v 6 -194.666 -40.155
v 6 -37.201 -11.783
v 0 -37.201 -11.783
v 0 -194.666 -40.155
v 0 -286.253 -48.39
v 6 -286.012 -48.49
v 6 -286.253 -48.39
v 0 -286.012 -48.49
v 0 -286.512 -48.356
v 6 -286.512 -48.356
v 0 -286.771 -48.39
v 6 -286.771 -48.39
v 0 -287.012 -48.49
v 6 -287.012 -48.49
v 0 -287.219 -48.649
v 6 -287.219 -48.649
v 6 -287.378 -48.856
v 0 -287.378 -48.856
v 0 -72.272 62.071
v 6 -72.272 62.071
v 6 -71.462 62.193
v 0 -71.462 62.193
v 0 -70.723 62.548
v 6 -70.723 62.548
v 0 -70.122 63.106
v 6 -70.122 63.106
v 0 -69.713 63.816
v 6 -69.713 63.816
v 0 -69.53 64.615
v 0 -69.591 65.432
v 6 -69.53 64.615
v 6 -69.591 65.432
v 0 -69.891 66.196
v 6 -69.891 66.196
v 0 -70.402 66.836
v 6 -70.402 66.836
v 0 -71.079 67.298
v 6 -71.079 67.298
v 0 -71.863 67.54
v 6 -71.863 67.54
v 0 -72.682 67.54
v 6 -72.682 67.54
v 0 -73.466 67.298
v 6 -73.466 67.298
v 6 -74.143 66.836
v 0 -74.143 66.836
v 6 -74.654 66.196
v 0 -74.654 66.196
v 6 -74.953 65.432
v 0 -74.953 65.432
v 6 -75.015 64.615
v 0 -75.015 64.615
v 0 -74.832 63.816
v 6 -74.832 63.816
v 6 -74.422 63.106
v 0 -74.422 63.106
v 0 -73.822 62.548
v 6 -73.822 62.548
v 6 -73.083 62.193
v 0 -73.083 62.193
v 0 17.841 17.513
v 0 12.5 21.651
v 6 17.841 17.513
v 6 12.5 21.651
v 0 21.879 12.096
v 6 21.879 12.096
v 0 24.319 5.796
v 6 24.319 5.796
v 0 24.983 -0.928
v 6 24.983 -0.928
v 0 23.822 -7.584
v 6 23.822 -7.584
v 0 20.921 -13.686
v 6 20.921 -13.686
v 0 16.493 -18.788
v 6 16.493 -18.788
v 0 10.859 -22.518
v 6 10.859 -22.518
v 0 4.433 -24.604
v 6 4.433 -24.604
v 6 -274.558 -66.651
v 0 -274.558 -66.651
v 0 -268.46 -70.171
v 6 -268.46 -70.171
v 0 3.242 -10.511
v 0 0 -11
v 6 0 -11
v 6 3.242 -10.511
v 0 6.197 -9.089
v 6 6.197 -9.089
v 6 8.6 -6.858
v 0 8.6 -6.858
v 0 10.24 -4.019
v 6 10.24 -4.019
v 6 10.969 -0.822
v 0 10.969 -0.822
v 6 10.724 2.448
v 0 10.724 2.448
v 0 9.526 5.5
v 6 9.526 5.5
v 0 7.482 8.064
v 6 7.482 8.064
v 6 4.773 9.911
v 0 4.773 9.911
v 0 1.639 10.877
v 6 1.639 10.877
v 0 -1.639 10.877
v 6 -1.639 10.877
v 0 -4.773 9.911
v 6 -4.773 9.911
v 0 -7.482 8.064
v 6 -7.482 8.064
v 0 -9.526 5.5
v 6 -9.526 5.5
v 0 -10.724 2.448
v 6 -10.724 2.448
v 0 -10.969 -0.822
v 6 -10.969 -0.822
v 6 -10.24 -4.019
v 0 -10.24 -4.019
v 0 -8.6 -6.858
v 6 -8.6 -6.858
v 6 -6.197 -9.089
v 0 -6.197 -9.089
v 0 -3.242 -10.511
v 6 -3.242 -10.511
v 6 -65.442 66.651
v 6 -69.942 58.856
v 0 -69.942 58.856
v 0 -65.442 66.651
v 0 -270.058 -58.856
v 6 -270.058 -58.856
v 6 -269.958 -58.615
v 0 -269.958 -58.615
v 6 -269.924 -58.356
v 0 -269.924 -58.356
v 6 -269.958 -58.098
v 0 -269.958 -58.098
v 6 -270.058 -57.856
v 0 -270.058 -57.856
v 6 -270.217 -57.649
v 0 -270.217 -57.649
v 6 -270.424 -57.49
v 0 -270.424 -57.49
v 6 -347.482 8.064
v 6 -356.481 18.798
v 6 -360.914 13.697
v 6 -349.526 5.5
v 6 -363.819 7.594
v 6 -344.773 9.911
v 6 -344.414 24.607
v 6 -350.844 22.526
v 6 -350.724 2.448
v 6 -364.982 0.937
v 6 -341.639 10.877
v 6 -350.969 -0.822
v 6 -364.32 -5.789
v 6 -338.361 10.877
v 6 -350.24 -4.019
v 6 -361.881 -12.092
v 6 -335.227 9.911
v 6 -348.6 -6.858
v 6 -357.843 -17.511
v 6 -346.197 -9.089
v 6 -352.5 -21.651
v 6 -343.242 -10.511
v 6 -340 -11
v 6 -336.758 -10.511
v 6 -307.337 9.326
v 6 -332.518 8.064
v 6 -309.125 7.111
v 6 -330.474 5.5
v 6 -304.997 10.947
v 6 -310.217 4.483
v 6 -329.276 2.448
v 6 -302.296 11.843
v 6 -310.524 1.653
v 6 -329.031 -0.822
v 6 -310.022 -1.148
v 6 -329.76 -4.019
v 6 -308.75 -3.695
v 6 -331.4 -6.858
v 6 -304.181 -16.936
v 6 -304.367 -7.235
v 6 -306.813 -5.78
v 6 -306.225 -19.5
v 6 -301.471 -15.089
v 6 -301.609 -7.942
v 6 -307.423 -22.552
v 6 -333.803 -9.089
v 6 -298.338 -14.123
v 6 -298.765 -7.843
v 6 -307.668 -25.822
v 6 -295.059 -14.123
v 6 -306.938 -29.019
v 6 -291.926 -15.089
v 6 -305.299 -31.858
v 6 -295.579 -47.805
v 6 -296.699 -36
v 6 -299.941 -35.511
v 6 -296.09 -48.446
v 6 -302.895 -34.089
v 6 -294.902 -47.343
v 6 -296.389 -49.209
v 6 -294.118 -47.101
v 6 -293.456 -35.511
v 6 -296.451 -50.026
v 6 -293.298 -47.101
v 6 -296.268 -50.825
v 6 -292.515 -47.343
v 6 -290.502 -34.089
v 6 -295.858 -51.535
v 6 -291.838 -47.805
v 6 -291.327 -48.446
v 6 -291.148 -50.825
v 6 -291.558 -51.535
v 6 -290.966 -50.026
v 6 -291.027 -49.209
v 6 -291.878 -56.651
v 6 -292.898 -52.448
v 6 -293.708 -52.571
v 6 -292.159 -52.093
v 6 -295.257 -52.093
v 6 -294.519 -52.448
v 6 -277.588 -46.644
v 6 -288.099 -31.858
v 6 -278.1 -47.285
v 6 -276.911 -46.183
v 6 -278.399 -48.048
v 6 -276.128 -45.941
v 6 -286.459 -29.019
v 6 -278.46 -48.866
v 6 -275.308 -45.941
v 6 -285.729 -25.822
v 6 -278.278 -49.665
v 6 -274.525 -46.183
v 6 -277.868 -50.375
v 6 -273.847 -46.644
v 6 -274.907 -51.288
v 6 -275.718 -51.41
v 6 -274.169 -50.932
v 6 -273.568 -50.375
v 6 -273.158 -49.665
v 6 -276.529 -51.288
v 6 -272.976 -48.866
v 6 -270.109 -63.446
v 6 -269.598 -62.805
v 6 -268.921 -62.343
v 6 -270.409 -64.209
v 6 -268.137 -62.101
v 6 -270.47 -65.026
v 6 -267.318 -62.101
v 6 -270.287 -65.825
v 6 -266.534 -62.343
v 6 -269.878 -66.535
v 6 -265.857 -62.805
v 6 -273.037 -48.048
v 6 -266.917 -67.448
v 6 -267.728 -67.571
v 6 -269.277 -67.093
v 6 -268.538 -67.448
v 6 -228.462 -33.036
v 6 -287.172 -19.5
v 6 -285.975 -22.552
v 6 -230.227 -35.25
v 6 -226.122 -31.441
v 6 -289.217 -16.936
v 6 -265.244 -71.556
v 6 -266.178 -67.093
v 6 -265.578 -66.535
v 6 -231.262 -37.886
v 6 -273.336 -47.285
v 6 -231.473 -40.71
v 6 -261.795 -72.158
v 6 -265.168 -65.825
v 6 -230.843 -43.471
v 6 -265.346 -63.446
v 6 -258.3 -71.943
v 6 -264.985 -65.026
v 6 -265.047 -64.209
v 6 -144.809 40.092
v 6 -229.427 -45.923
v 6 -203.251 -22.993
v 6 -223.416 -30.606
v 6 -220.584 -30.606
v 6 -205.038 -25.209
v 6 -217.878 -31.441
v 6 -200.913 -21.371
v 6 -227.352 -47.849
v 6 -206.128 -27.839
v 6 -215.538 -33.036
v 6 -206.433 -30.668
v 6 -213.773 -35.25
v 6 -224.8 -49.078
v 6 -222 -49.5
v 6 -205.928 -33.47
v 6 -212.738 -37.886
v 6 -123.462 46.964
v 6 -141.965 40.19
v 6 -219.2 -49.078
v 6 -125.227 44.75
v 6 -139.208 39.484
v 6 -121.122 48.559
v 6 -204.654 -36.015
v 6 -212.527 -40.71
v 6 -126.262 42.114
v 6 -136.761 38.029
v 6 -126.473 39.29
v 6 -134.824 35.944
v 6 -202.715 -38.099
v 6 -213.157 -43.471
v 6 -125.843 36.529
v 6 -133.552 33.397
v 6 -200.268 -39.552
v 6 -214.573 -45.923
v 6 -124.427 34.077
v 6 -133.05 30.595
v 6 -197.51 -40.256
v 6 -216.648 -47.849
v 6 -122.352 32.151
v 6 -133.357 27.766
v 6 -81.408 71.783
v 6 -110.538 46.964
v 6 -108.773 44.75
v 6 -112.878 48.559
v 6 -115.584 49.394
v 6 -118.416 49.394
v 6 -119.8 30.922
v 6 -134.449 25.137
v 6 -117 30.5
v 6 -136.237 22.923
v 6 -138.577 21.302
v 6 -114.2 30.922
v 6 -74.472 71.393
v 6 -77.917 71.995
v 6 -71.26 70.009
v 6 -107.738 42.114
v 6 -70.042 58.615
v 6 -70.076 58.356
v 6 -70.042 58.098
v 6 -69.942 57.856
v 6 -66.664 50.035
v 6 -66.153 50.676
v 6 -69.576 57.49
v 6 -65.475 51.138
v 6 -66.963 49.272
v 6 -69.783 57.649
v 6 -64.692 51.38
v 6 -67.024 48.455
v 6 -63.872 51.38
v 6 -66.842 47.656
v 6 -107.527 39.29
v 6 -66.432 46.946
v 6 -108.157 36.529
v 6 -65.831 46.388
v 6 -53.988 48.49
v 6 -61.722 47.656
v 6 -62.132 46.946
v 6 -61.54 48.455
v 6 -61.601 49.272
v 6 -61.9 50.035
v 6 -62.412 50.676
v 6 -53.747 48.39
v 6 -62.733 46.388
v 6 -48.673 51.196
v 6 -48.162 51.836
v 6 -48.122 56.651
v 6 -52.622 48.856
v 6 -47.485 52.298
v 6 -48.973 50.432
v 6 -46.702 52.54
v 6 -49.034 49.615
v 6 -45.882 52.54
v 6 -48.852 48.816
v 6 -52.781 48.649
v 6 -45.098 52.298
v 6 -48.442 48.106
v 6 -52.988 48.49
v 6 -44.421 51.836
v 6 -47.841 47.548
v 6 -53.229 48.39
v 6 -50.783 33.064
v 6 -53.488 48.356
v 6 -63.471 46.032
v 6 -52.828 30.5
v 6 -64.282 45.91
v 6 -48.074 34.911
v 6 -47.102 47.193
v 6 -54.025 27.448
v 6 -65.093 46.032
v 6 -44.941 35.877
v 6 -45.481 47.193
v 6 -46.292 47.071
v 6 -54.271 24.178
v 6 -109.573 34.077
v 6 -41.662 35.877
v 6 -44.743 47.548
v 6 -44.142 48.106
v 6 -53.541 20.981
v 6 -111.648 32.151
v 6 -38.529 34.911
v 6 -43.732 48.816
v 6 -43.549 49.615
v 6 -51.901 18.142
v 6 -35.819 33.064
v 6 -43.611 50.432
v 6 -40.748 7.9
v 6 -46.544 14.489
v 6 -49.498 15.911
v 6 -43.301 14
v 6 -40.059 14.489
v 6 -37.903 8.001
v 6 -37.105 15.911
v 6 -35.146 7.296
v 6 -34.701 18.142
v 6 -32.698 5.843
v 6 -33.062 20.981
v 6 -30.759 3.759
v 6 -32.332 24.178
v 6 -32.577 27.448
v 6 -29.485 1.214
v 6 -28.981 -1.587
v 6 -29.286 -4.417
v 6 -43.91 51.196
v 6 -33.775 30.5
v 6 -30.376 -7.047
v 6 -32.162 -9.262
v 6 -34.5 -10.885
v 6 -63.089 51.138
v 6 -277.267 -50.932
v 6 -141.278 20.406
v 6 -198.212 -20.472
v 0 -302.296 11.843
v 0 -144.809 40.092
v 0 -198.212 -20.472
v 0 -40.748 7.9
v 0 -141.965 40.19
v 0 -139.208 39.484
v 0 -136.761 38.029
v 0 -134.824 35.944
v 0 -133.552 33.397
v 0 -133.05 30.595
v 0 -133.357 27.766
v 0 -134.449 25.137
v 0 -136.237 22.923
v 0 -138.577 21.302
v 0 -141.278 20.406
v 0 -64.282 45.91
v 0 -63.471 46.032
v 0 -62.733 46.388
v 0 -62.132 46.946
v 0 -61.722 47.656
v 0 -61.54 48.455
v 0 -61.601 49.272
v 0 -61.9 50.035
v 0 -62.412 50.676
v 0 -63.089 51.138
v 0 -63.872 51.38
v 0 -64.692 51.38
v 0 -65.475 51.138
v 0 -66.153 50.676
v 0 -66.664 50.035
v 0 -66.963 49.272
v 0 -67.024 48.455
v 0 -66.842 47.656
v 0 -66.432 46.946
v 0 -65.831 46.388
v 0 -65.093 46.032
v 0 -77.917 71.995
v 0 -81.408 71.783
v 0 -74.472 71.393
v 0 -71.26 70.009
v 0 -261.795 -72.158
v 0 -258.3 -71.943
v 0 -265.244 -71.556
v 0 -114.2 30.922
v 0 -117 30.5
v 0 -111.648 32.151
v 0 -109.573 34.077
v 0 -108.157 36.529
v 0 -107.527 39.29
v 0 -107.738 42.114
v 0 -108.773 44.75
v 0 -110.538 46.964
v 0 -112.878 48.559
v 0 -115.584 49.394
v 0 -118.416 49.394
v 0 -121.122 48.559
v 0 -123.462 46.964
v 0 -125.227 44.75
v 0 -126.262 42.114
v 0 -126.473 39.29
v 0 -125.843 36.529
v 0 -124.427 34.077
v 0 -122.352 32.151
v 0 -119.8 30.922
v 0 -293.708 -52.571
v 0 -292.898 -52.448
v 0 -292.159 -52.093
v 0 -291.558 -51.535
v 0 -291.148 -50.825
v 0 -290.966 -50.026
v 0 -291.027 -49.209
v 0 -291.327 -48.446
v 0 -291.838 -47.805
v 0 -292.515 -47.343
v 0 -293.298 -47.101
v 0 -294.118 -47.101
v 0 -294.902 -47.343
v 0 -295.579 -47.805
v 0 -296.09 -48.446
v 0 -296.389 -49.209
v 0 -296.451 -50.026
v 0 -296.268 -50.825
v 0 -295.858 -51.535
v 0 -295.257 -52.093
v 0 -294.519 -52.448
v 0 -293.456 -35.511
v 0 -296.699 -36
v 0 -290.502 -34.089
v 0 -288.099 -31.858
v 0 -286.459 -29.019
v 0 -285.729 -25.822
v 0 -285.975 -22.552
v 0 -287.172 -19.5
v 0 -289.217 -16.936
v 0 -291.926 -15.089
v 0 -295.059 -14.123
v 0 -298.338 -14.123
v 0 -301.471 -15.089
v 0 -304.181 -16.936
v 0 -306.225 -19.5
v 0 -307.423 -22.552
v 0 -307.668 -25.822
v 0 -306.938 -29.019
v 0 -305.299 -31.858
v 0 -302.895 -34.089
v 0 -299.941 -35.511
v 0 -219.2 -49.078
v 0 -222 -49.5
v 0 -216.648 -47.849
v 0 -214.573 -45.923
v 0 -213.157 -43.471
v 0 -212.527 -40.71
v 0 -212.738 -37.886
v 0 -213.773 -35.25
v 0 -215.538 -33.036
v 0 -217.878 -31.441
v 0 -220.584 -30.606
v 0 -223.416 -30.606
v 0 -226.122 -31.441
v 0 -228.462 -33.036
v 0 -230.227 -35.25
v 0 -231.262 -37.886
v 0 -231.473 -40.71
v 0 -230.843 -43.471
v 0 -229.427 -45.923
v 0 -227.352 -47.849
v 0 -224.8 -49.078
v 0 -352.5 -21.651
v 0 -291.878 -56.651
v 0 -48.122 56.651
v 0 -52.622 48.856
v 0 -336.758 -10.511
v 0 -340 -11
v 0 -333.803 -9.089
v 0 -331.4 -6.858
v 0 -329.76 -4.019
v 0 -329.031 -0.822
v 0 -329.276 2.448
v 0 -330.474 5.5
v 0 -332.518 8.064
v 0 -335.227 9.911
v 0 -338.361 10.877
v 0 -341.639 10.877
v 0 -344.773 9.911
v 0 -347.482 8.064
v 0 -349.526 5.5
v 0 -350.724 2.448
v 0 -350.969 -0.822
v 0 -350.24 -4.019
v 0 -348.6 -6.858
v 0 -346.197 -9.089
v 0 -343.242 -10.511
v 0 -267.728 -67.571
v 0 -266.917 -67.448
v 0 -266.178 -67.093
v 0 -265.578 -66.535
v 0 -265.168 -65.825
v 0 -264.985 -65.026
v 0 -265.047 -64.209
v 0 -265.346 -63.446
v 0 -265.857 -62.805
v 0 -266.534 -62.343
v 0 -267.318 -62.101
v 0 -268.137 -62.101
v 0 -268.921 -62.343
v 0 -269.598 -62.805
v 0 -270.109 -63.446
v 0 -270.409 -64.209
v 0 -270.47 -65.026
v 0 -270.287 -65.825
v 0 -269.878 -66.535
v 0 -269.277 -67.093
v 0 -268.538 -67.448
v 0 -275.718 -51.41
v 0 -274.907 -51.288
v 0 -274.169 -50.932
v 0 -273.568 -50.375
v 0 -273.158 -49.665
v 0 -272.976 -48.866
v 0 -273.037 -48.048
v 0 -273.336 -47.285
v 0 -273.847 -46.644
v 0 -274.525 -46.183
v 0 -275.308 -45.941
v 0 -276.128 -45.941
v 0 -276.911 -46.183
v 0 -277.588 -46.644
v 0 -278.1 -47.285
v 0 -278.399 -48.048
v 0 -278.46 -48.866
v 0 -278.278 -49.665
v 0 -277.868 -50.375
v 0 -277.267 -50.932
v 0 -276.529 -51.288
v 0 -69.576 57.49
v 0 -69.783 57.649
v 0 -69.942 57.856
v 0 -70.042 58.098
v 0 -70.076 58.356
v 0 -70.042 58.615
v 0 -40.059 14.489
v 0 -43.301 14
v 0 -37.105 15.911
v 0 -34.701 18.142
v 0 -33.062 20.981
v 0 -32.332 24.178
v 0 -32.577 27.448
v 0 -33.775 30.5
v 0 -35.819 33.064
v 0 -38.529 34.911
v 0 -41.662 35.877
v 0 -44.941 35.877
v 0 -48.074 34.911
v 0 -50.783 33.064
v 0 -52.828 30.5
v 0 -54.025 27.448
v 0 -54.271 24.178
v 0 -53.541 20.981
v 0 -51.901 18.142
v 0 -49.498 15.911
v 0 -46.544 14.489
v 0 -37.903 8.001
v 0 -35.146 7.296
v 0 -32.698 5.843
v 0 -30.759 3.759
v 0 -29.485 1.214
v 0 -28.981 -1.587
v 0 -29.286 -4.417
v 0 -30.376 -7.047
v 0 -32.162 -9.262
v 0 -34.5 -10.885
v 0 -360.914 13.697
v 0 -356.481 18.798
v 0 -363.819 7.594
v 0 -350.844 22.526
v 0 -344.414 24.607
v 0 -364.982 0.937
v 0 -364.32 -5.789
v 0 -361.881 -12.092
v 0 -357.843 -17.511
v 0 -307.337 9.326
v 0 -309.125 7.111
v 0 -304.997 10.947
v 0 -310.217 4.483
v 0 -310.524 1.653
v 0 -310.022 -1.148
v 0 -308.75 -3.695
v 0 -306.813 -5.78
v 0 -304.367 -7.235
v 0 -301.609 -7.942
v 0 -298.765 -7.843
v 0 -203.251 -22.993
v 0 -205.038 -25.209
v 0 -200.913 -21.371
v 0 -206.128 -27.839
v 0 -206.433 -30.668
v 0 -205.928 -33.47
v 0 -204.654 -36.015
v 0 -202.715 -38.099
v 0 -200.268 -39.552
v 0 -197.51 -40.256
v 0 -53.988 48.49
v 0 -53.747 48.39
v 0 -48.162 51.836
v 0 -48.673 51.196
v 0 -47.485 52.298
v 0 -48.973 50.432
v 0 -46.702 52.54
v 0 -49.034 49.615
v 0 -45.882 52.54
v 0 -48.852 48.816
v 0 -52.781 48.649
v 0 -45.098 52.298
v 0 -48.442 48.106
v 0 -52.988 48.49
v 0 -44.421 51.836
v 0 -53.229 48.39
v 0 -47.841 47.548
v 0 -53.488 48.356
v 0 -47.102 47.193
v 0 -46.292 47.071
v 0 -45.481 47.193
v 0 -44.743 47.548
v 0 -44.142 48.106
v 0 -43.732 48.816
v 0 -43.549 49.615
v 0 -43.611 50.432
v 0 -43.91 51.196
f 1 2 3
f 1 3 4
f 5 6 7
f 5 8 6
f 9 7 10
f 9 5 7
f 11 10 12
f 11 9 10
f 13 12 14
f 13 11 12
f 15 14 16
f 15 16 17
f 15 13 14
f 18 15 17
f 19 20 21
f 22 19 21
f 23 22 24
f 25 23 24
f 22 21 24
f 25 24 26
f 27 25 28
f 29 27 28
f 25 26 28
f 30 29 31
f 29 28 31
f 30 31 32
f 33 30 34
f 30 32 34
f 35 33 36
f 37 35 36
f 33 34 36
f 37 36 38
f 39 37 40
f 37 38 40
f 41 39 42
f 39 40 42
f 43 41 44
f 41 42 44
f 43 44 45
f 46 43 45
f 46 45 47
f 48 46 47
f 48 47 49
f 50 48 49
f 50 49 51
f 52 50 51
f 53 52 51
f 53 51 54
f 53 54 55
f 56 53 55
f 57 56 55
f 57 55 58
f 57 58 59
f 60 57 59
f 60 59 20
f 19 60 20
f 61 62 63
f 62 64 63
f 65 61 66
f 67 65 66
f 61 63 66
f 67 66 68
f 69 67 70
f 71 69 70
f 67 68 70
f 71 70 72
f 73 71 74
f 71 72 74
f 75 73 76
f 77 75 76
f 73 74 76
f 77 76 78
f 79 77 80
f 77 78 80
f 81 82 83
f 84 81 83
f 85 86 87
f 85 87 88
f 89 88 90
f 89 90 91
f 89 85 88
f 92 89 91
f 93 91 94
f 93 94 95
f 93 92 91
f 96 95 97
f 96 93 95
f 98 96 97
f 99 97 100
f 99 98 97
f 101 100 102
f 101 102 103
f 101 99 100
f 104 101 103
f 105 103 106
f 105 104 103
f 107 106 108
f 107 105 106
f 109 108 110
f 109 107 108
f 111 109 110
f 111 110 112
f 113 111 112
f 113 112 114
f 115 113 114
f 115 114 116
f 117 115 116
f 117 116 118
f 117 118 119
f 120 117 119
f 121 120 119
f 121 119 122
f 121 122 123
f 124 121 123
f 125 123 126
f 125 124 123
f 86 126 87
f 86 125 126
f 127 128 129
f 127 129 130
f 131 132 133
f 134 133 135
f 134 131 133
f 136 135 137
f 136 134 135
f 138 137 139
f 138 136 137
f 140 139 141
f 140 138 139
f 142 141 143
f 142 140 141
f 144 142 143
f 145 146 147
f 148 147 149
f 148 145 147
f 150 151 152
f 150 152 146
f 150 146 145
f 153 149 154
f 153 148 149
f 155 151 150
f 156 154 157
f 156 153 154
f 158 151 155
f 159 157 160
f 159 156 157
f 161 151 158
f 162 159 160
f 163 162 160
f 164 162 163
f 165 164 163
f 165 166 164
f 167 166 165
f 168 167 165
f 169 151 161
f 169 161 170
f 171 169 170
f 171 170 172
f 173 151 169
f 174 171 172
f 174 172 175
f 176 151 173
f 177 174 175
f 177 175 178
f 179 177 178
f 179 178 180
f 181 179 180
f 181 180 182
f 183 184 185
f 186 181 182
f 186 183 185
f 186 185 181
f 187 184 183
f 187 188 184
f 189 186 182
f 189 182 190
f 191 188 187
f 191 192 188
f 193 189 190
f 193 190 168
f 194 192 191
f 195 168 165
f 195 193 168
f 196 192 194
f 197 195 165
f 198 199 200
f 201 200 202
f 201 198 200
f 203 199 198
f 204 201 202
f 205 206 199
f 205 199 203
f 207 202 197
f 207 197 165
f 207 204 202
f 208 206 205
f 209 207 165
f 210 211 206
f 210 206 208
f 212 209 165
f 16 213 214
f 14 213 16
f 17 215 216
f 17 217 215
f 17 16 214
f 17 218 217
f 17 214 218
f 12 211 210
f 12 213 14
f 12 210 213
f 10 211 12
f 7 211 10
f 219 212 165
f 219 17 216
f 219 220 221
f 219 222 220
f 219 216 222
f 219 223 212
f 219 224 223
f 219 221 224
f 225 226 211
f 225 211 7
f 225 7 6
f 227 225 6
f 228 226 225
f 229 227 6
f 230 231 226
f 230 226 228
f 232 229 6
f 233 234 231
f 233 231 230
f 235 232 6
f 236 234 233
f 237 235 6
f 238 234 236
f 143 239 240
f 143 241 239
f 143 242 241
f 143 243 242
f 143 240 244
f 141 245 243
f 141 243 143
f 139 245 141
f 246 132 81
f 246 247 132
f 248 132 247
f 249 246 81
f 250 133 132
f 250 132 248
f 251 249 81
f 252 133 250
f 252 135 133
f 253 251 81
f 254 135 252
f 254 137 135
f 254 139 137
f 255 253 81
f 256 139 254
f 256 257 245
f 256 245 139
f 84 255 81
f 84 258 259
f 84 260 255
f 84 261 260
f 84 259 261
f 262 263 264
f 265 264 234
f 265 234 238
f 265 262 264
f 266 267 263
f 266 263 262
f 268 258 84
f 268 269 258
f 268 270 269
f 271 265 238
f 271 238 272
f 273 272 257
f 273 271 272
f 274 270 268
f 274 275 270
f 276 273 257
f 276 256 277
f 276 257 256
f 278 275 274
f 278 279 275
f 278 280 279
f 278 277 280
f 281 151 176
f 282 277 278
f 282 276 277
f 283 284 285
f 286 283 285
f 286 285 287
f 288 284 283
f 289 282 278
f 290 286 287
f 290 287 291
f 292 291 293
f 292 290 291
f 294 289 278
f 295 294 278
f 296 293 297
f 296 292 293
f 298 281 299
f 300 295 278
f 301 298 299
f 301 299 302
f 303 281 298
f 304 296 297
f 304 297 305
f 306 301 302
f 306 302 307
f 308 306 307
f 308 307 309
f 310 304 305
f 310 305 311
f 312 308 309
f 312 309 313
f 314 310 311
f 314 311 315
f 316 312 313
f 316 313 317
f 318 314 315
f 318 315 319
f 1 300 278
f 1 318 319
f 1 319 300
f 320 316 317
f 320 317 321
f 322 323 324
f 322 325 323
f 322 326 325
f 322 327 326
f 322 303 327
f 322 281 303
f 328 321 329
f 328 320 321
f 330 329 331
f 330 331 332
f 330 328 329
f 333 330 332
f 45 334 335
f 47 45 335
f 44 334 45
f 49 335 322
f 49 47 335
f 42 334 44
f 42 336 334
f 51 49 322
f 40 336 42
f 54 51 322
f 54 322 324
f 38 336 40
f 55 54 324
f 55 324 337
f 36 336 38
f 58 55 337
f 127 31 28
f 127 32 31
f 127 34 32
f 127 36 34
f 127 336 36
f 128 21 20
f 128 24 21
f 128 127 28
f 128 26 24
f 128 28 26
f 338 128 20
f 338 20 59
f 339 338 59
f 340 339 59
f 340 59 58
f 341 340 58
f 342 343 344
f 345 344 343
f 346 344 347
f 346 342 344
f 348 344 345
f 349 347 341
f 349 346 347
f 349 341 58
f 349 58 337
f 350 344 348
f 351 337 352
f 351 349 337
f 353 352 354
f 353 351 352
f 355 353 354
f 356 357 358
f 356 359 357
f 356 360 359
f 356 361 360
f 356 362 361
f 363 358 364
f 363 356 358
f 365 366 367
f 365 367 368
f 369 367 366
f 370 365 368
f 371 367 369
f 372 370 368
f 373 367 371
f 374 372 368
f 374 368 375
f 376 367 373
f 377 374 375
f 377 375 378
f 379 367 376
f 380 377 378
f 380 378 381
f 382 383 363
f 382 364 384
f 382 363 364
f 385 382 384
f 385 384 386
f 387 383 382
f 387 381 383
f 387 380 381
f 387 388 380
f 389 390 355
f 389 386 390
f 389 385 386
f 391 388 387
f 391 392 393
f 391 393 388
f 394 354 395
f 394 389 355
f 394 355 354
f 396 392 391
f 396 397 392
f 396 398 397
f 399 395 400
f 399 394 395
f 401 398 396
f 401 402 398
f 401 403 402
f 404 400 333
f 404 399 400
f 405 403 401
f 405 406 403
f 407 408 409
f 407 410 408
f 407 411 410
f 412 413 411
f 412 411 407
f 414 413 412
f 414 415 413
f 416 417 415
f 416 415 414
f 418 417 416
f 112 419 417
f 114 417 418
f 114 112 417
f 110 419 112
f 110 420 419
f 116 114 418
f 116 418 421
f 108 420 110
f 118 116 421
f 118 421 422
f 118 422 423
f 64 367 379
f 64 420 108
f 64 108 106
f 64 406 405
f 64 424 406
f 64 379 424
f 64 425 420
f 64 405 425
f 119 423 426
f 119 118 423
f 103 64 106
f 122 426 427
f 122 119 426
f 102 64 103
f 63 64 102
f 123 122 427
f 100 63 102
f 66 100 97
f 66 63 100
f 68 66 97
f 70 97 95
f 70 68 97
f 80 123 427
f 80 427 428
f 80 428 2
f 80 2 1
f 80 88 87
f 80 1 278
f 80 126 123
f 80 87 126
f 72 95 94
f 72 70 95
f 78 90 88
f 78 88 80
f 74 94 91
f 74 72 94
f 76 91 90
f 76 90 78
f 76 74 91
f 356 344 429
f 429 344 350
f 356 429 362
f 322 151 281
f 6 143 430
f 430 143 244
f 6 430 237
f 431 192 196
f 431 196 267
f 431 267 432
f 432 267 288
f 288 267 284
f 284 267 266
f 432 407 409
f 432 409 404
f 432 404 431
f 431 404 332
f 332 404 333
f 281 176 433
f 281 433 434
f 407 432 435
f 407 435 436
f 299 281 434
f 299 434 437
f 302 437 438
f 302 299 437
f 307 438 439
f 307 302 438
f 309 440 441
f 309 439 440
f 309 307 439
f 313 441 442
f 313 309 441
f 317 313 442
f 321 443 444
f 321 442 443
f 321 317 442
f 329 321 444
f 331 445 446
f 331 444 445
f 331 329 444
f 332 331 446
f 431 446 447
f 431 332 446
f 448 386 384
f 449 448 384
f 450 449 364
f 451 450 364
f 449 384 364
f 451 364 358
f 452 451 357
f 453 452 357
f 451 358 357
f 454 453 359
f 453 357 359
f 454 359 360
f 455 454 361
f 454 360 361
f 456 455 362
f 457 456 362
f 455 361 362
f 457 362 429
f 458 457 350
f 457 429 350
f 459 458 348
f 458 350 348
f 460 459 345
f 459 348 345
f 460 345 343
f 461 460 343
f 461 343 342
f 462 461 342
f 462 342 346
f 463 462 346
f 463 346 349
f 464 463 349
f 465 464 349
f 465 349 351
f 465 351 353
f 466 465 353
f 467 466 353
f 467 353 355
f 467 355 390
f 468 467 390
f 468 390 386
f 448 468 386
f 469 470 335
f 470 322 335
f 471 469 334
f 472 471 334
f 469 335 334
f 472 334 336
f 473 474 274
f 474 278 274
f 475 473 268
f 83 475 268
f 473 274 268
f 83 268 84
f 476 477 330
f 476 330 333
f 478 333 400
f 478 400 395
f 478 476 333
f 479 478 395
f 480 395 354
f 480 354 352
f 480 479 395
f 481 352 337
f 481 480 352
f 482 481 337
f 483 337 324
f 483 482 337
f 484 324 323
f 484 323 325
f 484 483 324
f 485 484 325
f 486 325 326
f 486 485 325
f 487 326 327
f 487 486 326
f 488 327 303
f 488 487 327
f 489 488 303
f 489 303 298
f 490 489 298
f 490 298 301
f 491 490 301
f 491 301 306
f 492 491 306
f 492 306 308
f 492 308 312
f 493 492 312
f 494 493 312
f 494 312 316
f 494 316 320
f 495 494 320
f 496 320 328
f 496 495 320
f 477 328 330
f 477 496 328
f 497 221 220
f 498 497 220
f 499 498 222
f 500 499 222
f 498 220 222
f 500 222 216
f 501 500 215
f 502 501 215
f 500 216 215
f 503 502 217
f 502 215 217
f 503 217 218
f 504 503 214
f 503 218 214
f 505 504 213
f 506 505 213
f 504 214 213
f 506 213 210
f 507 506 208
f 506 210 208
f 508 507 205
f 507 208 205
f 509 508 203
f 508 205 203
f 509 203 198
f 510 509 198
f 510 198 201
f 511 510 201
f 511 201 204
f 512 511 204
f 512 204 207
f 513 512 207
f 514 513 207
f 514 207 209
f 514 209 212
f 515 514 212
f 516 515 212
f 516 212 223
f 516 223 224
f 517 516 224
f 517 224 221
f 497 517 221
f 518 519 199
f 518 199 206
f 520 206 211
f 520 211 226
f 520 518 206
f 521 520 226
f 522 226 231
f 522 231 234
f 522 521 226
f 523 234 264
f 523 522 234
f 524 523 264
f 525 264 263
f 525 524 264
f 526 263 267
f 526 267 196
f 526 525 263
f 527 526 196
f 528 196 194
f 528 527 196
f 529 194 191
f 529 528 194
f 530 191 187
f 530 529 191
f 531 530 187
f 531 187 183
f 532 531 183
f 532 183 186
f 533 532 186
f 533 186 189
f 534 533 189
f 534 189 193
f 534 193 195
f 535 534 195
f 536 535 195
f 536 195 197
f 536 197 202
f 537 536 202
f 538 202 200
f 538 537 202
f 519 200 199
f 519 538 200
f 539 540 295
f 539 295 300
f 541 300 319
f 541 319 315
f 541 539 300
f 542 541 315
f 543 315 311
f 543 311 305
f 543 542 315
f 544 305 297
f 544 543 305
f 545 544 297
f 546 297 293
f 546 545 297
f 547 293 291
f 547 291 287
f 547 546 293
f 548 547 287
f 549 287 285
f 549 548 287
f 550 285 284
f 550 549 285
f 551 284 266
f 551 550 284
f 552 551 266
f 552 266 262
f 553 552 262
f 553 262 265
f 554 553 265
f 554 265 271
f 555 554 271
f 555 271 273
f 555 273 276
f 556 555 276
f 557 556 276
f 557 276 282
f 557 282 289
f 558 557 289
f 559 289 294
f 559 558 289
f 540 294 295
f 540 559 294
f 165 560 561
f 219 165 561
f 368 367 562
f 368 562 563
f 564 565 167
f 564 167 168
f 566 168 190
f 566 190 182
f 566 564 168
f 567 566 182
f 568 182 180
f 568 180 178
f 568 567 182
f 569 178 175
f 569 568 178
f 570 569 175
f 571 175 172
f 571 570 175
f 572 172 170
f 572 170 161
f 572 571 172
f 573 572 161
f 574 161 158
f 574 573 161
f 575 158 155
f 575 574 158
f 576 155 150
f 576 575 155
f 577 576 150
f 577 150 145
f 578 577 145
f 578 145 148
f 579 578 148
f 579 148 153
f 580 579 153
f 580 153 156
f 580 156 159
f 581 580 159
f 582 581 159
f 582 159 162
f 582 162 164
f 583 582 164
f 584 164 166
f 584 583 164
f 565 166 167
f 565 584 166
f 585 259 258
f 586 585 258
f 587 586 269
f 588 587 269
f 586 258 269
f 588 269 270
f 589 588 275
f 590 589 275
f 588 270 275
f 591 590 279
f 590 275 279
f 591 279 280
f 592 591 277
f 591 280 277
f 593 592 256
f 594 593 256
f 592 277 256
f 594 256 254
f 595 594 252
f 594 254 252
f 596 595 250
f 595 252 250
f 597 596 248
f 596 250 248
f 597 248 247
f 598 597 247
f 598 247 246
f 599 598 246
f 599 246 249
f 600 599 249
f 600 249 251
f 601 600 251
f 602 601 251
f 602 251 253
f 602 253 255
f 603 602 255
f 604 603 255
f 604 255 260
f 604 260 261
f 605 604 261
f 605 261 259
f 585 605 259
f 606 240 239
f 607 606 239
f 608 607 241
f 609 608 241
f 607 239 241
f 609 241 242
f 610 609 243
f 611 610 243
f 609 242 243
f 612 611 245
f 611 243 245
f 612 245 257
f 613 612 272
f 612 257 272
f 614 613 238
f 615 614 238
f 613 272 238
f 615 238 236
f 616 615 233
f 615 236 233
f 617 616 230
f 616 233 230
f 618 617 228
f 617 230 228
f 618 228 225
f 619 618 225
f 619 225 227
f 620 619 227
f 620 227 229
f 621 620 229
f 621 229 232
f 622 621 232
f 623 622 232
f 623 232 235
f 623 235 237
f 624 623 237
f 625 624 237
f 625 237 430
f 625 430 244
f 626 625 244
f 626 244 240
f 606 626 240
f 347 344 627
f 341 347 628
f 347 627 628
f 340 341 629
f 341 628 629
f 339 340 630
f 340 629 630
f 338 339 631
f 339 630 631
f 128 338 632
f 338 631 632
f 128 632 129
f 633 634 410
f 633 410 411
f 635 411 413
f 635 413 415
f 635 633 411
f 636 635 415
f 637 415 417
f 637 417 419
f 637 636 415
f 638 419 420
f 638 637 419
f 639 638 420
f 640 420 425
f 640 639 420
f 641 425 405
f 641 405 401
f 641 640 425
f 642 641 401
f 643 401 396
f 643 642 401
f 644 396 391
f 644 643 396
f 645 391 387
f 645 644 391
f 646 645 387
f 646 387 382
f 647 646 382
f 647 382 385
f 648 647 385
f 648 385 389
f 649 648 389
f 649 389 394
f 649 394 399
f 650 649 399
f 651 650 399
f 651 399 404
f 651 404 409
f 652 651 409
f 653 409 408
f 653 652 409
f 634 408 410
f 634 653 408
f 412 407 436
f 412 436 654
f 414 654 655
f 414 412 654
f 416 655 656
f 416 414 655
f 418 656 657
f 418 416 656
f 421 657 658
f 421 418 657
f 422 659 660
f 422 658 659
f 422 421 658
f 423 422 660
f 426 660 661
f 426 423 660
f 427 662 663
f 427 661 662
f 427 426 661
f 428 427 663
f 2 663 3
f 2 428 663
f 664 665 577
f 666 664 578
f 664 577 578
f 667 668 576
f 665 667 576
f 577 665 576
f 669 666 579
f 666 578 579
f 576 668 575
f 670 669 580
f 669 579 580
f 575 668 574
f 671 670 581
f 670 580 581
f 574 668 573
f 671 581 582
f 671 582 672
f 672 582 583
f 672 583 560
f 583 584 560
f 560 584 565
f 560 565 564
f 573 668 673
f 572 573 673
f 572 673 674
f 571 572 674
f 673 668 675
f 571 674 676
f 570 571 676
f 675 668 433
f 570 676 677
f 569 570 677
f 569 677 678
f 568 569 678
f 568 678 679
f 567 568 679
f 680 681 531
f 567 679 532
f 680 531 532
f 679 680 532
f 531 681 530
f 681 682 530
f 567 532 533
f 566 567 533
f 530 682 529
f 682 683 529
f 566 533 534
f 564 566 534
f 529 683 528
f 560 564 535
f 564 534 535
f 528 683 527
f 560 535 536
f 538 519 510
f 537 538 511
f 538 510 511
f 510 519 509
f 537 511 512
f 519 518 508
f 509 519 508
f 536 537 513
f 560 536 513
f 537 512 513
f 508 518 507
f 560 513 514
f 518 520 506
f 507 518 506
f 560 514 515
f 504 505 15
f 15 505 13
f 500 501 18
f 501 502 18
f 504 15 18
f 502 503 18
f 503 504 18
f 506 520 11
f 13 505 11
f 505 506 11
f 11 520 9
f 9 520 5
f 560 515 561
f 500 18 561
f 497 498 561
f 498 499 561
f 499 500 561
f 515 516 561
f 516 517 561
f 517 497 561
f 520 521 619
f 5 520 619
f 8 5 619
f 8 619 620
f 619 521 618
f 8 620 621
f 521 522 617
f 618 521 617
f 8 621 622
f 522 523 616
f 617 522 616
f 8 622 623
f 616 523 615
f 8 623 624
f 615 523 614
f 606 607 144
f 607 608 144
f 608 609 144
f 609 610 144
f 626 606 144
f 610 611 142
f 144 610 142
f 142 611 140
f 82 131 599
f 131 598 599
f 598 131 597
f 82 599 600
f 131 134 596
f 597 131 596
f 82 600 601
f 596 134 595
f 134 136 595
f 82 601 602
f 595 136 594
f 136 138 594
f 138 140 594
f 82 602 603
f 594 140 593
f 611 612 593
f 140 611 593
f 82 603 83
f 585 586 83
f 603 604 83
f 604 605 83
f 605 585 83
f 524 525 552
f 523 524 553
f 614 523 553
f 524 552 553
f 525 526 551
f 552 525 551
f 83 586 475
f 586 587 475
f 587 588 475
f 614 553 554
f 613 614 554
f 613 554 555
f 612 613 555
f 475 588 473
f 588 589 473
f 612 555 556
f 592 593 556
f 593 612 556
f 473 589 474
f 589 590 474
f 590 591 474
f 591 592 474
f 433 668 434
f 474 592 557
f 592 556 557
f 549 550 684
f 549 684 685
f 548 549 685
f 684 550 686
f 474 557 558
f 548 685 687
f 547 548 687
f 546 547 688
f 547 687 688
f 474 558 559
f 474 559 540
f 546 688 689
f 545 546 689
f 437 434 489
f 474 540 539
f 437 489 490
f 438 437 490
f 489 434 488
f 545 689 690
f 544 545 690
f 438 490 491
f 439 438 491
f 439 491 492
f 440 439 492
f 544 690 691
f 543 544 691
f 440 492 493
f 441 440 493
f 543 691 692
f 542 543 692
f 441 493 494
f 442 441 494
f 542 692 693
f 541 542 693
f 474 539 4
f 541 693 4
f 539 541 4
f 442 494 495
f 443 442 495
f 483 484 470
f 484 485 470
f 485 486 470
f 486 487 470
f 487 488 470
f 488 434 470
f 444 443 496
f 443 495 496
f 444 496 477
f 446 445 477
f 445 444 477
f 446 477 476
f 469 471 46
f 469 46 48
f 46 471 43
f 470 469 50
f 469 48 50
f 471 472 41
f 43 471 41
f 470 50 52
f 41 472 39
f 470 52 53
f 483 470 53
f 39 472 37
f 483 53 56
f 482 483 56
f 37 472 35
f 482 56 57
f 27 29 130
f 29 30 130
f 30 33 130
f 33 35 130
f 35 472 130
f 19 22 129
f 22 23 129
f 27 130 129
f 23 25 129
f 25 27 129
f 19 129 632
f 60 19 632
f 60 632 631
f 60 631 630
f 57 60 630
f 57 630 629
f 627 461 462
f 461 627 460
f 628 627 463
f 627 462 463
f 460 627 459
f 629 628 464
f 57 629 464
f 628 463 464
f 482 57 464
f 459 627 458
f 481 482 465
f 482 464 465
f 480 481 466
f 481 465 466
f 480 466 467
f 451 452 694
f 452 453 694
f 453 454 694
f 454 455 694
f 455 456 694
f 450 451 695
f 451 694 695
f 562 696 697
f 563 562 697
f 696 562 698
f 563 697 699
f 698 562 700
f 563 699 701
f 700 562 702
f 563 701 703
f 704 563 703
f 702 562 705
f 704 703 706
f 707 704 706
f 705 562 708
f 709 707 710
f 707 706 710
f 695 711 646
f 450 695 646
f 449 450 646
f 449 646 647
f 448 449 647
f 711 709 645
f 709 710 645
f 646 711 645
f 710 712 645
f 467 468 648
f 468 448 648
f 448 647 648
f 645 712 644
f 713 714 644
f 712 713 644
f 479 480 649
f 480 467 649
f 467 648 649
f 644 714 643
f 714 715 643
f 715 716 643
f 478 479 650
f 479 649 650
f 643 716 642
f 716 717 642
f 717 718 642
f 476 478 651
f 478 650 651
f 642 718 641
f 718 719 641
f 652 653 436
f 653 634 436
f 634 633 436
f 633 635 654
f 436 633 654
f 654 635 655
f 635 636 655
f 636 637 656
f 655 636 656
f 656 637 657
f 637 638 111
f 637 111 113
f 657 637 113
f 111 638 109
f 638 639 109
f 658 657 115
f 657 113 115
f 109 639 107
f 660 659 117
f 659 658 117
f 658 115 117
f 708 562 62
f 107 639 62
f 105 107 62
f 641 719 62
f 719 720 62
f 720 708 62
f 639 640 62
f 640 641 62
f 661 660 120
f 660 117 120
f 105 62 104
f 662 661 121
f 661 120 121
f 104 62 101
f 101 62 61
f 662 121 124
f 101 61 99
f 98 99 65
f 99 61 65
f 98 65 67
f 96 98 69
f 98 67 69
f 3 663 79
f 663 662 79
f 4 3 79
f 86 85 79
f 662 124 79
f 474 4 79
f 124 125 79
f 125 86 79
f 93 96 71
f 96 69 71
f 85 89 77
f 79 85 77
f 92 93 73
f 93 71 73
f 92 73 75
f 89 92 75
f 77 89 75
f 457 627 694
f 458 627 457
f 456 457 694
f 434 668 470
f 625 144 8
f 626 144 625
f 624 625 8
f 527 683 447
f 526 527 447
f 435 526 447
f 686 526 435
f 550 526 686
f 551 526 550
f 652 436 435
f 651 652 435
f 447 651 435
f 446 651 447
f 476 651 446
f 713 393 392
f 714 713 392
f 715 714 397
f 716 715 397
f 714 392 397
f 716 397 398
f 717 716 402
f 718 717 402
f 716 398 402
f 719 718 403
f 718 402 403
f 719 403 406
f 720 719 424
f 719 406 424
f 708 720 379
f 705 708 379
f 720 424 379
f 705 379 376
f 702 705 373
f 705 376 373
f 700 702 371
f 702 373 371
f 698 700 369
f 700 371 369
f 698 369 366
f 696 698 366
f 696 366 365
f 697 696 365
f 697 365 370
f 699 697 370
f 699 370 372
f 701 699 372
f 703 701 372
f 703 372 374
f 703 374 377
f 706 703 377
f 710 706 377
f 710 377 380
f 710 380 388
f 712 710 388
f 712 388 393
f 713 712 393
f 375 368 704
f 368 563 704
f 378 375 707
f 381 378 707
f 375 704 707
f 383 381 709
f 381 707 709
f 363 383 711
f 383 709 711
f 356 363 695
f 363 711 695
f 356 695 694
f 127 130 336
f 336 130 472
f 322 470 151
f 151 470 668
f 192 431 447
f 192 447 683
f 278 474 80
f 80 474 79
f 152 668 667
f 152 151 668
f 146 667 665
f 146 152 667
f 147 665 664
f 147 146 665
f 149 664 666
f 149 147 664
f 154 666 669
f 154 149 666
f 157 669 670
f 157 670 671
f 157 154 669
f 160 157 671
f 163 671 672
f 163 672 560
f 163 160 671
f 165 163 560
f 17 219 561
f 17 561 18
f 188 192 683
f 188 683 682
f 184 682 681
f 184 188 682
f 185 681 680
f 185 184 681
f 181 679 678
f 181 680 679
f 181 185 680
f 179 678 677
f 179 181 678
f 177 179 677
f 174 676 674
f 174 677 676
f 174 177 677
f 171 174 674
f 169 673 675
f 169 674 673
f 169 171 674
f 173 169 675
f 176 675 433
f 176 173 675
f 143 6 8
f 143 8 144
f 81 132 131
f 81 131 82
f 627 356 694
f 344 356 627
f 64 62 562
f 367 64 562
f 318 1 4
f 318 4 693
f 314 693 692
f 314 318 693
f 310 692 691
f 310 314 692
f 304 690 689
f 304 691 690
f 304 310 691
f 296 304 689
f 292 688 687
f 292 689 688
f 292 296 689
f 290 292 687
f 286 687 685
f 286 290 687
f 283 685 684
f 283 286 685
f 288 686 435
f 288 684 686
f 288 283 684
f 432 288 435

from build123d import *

# Parameters (mm, degrees)
SKETCH_2_R          = 9.5
SKETCH_2_R_2        = 11
EXTRUDE_1_DEPTH     = 6
CUT_EXTRUDE_1_DEPTH = 10
FILLET_1_R          = 25
SKETCH_4_R          = 2.75
CUT_EXTRUDE_2_DEPTH = 10
FILLET_2_R          = 15
FILLET_3_R          = 1


with BuildPart() as part:
    # 草图2 → 凸台-拉伸1 (new body)
    with BuildSketch(Plane(origin=(0, 0, 0), x_dir=(0, 0, -1), z_dir=(1, 0, 0))):
        Polygon((12.494318662, 71.640794729), (-72.751567756, -76.009411684), (-12.535755442, -411.712565336), (72.916857811, -263.704297543), align=None)
        with Locations((-40, -117)):
            Circle(SKETCH_2_R, mode=Mode.SUBTRACT)
        with Locations((25, -296.698729811)):
            Circle(SKETCH_2_R_2, mode=Mode.SUBTRACT)
        with Locations((0, -340)):
            Circle(SKETCH_2_R_2, mode=Mode.SUBTRACT)
        with Locations((-25, -43.301270189)):
            Circle(SKETCH_2_R_2, mode=Mode.SUBTRACT)
        with Locations((40, -222)):
            Circle(SKETCH_2_R, mode=Mode.SUBTRACT)
        Circle(SKETCH_2_R_2, mode=Mode.SUBTRACT)
    extrude(amount=EXTRUDE_1_DEPTH)

    # 草图3 → 切除-拉伸1 (cut)
    with BuildSketch(Plane(origin=(6, 0, 0), x_dir=(0, 0, -1), z_dir=(1, 0, 0))):
        with BuildLine():
            Line((-20.40575236, -141.278289439), (7.842954525, -298.764830322))
            ThreePointArc((7.842954525, -298.764830322), (-0.2344101, -310.373283308), (-11.842863085, -302.295918683))
            Line((-11.842863085, -302.295918683), (-40.09156997, -144.8093778))
            ThreePointArc((-40.09156997, -144.8093778), (-32.014205345, -133.200924814), (-20.40575236, -141.278289439))
        make_face()
        with BuildLine():
            Line((11.783440235, -37.201240644), (40.155401092, -194.665623401))
            ThreePointArc((40.155401092, -194.665623401), (32.087124724, -206.280394877), (20.472353248, -198.212118508))
            Line((20.472353248, -198.212118508), (-7.89960761, -40.747735751))
            ThreePointArc((-7.89960761, -40.747735751), (0.168668759, -29.132964275), (11.783440235, -37.201240644))
        make_face()
    extrude(amount=-CUT_EXTRUDE_1_DEPTH, mode=Mode.SUBTRACT)

    # 圆角1
    fillet_1_edges = [part.edges().sort_by_distance(p)[0] for p in [
        (3, -411.712565336, 12.535755442),
        (3, 71.640794729, -12.494318662),
    ]]
    fillet(fillet_1_edges, radius=FILLET_1_R)

    # 草图4 → 切除-拉伸2 (cut)
    with BuildSketch(Plane(origin=(6, 0, 0), x_dir=(0, 0, -1), z_dir=(1, 0, 0))):
        with Locations((-49.820508076, -46.291651246)):
            Circle(SKETCH_4_R)
        with Locations((-64.820508076, -72.27241336)):
            Circle(SKETCH_4_R)
        with Locations((-48.660254038, -64.282032303)):
            Circle(SKETCH_4_R)
        with Locations((48.660254038, -275.717967697)):
            Circle(SKETCH_4_R)
        with Locations((49.820508076, -293.708348754)):
            Circle(SKETCH_4_R)
        with Locations((64.820508076, -267.72758664)):
            Circle(SKETCH_4_R)
        Polygon((-66.650635095, -65.442286341), (-56.650635095, -48.121778265), (-47.990381057, -53.121778265), (-57.990381057, -70.442286341), align=None)
        Polygon((47.990381057, -286.878221735), (57.990381057, -269.557713659), (66.650635095, -274.557713659), (56.650635095, -291.878221735), align=None)
    extrude(amount=-CUT_EXTRUDE_2_DEPTH, mode=Mode.SUBTRACT)

    # 圆角2
    fillet_2_edges = [part.edges().sort_by_distance(p)[0] for p in [
        (3, -263.704297543, -72.916857811),
        (3, -76.009411684, 72.751567756),
    ]]
    fillet(fillet_2_edges, radius=FILLET_2_R)

    # 圆角3
    fillet_3_edges = [part.edges().sort_by_distance(p)[0] for p in [
        (3, -286.878221735, -47.990381057),
        (3, -269.557713659, -57.990381057),
        (3, -53.121778265, 47.990381057),
        (3, -70.442286341, 57.990381057),
    ]]
    fillet(fillet_3_edges, radius=FILLET_3_R)


solid = part.part
